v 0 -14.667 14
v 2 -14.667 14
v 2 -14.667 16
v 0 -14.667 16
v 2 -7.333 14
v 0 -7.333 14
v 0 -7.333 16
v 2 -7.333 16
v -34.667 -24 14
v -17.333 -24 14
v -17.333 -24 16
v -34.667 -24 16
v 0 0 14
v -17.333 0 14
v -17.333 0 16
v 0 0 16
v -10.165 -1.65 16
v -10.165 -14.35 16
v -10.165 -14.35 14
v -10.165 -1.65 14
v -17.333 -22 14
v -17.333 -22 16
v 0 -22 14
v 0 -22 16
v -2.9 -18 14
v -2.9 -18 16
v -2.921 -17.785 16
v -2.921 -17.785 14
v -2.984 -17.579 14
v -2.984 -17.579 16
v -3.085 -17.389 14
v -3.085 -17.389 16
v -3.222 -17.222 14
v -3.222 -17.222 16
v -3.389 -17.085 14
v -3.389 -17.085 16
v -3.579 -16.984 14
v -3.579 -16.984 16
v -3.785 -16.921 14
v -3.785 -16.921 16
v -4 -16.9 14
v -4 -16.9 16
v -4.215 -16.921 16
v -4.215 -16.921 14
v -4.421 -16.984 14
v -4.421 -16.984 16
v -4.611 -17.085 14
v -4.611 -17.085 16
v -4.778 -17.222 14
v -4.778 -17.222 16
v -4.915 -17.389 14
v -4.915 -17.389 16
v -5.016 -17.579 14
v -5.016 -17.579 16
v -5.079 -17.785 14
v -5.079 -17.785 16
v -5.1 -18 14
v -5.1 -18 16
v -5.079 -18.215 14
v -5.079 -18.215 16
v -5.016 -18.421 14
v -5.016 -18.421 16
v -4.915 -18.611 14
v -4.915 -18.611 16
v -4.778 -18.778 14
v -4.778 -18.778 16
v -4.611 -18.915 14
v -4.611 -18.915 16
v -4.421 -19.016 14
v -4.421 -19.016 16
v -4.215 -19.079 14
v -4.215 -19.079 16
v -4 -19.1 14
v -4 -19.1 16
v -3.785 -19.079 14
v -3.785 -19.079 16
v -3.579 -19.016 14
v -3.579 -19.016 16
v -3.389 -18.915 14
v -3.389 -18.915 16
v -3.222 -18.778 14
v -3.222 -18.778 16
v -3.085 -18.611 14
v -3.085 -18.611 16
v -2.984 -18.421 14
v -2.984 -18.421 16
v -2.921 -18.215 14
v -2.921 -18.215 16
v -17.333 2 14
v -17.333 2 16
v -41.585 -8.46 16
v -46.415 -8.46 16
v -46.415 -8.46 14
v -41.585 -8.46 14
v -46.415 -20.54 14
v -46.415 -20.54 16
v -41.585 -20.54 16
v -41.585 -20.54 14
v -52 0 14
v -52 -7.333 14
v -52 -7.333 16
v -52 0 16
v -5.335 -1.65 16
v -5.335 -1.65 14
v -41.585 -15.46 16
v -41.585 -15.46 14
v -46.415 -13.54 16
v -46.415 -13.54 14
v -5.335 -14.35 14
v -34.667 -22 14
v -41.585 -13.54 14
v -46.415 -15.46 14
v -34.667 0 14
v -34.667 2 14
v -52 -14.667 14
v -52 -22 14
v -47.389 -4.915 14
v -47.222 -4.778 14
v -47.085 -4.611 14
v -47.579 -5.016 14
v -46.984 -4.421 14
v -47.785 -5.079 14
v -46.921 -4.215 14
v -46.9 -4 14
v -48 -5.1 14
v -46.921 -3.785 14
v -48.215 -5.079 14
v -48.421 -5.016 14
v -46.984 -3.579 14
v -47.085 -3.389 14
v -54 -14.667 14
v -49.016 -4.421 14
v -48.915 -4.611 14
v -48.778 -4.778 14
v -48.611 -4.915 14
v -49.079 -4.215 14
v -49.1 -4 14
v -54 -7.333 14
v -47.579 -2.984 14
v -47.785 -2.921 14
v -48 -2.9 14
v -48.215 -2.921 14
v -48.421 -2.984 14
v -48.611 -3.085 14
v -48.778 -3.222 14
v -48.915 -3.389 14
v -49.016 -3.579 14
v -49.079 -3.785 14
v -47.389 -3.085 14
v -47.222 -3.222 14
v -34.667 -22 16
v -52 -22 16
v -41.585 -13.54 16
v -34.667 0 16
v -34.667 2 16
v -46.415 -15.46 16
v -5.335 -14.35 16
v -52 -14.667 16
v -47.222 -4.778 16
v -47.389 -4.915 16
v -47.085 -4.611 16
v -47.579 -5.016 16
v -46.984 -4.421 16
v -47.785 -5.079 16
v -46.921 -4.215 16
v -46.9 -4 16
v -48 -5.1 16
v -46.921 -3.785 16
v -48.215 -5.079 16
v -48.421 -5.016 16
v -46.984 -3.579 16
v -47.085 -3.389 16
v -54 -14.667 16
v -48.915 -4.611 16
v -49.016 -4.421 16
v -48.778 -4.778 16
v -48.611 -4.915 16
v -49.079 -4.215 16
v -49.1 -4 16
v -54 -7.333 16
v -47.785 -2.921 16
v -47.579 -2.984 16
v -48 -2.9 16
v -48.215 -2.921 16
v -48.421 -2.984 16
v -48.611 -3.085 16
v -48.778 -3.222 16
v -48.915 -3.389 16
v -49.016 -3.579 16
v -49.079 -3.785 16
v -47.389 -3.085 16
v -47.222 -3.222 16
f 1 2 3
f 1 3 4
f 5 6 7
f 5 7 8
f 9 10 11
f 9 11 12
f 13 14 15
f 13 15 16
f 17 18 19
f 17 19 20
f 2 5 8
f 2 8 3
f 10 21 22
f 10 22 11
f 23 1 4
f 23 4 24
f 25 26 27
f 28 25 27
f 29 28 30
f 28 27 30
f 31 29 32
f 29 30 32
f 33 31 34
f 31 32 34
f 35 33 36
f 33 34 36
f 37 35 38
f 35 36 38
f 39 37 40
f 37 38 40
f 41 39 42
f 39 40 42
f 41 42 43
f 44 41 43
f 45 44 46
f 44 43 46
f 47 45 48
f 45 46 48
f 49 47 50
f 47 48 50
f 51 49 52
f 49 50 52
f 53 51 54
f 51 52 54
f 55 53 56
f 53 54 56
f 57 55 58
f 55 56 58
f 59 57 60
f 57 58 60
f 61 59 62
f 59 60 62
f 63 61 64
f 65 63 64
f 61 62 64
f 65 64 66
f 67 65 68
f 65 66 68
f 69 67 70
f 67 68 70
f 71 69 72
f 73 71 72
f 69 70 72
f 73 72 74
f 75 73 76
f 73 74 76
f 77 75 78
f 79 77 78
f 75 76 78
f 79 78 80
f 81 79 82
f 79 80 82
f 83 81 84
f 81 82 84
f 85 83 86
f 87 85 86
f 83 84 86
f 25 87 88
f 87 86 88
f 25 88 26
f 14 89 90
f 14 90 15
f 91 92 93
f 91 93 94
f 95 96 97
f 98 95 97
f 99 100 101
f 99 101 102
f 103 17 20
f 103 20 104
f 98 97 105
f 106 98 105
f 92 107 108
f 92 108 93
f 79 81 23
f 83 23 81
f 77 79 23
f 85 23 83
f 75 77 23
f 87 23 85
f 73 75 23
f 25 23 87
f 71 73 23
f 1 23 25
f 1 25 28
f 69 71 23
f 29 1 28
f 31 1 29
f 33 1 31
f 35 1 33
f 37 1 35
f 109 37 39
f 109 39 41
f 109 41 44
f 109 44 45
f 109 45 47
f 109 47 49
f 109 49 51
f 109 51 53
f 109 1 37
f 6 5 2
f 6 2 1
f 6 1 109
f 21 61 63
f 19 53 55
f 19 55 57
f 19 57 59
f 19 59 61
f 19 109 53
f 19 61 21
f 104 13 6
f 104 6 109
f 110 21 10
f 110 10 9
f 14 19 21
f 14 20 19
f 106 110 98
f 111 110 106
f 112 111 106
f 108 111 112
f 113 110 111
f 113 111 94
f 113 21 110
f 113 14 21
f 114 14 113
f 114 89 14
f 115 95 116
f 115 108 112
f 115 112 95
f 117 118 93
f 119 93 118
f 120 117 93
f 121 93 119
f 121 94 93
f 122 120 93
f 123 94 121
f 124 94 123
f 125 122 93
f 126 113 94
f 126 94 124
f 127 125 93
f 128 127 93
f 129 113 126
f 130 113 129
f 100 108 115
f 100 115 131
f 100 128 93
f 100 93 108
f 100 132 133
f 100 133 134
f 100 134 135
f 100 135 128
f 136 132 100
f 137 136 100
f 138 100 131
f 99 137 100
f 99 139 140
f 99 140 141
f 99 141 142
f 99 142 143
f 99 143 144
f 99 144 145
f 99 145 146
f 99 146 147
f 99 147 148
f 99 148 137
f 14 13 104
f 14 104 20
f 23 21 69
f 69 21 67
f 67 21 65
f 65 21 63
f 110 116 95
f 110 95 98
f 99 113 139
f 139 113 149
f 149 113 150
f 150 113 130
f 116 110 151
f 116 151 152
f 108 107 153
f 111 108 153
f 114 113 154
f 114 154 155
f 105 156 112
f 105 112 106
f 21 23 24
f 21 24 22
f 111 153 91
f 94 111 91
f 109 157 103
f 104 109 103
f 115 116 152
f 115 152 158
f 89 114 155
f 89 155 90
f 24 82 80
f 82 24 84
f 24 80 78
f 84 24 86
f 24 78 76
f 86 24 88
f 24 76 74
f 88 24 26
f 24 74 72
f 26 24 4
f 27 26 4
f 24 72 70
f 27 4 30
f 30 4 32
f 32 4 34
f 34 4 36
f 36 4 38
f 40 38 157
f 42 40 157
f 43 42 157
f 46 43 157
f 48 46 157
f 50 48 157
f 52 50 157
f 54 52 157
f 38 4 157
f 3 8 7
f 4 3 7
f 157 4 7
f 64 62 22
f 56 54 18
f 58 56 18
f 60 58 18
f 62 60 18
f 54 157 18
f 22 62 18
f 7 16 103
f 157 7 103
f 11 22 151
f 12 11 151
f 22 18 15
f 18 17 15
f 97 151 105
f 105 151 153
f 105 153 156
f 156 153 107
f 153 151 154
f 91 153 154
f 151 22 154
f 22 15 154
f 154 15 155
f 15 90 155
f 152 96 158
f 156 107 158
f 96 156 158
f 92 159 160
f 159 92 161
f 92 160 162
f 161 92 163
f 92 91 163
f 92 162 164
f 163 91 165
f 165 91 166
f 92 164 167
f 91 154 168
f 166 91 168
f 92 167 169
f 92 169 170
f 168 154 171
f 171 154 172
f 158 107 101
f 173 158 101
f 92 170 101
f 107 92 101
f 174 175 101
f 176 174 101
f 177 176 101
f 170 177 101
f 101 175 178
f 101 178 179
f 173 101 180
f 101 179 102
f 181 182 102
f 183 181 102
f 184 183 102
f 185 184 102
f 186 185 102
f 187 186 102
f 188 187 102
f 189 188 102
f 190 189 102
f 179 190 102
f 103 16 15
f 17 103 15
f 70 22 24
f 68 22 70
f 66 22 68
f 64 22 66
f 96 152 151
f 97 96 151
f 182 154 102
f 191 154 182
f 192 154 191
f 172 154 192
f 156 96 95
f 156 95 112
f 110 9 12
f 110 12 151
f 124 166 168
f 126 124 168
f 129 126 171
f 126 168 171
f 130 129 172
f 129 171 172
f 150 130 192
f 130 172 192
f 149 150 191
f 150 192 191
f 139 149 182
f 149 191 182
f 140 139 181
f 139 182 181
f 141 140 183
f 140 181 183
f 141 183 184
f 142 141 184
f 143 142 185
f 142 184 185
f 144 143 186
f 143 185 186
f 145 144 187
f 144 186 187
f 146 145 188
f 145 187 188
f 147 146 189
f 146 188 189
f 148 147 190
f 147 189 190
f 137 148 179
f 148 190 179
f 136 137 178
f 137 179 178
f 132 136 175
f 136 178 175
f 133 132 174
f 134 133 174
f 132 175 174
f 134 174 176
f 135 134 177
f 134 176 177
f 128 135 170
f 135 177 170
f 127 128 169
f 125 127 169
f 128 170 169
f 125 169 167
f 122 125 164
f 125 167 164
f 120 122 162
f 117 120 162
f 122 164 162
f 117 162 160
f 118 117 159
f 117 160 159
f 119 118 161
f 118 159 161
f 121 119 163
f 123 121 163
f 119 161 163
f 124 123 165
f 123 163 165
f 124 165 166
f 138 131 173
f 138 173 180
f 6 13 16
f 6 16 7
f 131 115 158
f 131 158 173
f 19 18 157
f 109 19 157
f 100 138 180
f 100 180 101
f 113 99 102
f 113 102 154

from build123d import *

# Parameters (mm, degrees)
PAD001_DEPTH    = 2
SKETCH001_W     = 4.83
SKETCH001_H     = 12.7
POCKET_DEPTH    = 2
SKETCH006_W     = 4.83
SKETCH006_H     = 5.08
POCKET001_DEPTH = 2
SKETCH007_W     = 4.83
SKETCH007_H     = 5.08
POCKET002_DEPTH = 2
SKETCH029_R     = 1.1
POCKET011_DEPTH = 2
SKETCH030_R     = 1.1
POCKET012_DEPTH = 2


with BuildPart() as part:
    # Sketch → Pad001 (new body)
    with BuildSketch(Plane.XY):
        Polygon((-8.666667, 13), (8.666667, 13), (8.666667, 11), (26, 11), (26, 3.666667), (28, 3.666667), (28, -3.666667), (26, -3.666667), (26, -11), (8.666667, -11), (8.666667, -13), (-8.666667, -13), (-8.666667, -11), (-26, -11), (-26, -3.666667), (-28, -3.666667), (-28, 3.666667), (-26, 3.666667), (-26, 11), (-8.666667, 11), align=None)
    extrude(amount=PAD001_DEPTH)

    # Sketch001 (on Face22 of Pad001) → Pocket (cut)
    with BuildSketch(Plane.XY.offset(2)):
        with Locations((18.25, 3)):
            Rectangle(SKETCH001_W, SKETCH001_H)
    extrude(amount=-POCKET_DEPTH, mode=Mode.SUBTRACT)

    # Sketch006 (on Face5 of Pocket) → Pocket001 (cut)
    with BuildSketch(Plane.XY.offset(2)):
        with Locations((-18, 0)):
            Rectangle(SKETCH006_W, SKETCH006_H)
    extrude(amount=-POCKET001_DEPTH, mode=Mode.SUBTRACT)

    # Sketch007 (on Face5 of Pocket001) → Pocket002 (cut)
    with BuildSketch(Plane.XY.offset(2)):
        with Locations((-18, -7)):
            Rectangle(SKETCH007_W, SKETCH007_H)
    extrude(amount=-POCKET002_DEPTH, mode=Mode.SUBTRACT)

    # Sketch029 (on Face5 of Pocket002) → Pocket011 (cut)
    with BuildSketch(Plane.XY.offset(2)):
        with Locations((-22, 7)):
            Circle(SKETCH029_R)
    extrude(amount=-POCKET011_DEPTH, mode=Mode.SUBTRACT)

    # Sketch030 (on Face5 of Pocket011) → Pocket012 (cut)
    with BuildSketch(Plane.XY.offset(2)):
        with Locations((22, -7)):
            Circle(SKETCH030_R)
    extrude(amount=-POCKET012_DEPTH, mode=Mode.SUBTRACT)


with BuildPart() as part_1:
    # Body001 placement: moved
    add(part.part.moved(Location((-26, -11, 14))))


solid = part_1.part
